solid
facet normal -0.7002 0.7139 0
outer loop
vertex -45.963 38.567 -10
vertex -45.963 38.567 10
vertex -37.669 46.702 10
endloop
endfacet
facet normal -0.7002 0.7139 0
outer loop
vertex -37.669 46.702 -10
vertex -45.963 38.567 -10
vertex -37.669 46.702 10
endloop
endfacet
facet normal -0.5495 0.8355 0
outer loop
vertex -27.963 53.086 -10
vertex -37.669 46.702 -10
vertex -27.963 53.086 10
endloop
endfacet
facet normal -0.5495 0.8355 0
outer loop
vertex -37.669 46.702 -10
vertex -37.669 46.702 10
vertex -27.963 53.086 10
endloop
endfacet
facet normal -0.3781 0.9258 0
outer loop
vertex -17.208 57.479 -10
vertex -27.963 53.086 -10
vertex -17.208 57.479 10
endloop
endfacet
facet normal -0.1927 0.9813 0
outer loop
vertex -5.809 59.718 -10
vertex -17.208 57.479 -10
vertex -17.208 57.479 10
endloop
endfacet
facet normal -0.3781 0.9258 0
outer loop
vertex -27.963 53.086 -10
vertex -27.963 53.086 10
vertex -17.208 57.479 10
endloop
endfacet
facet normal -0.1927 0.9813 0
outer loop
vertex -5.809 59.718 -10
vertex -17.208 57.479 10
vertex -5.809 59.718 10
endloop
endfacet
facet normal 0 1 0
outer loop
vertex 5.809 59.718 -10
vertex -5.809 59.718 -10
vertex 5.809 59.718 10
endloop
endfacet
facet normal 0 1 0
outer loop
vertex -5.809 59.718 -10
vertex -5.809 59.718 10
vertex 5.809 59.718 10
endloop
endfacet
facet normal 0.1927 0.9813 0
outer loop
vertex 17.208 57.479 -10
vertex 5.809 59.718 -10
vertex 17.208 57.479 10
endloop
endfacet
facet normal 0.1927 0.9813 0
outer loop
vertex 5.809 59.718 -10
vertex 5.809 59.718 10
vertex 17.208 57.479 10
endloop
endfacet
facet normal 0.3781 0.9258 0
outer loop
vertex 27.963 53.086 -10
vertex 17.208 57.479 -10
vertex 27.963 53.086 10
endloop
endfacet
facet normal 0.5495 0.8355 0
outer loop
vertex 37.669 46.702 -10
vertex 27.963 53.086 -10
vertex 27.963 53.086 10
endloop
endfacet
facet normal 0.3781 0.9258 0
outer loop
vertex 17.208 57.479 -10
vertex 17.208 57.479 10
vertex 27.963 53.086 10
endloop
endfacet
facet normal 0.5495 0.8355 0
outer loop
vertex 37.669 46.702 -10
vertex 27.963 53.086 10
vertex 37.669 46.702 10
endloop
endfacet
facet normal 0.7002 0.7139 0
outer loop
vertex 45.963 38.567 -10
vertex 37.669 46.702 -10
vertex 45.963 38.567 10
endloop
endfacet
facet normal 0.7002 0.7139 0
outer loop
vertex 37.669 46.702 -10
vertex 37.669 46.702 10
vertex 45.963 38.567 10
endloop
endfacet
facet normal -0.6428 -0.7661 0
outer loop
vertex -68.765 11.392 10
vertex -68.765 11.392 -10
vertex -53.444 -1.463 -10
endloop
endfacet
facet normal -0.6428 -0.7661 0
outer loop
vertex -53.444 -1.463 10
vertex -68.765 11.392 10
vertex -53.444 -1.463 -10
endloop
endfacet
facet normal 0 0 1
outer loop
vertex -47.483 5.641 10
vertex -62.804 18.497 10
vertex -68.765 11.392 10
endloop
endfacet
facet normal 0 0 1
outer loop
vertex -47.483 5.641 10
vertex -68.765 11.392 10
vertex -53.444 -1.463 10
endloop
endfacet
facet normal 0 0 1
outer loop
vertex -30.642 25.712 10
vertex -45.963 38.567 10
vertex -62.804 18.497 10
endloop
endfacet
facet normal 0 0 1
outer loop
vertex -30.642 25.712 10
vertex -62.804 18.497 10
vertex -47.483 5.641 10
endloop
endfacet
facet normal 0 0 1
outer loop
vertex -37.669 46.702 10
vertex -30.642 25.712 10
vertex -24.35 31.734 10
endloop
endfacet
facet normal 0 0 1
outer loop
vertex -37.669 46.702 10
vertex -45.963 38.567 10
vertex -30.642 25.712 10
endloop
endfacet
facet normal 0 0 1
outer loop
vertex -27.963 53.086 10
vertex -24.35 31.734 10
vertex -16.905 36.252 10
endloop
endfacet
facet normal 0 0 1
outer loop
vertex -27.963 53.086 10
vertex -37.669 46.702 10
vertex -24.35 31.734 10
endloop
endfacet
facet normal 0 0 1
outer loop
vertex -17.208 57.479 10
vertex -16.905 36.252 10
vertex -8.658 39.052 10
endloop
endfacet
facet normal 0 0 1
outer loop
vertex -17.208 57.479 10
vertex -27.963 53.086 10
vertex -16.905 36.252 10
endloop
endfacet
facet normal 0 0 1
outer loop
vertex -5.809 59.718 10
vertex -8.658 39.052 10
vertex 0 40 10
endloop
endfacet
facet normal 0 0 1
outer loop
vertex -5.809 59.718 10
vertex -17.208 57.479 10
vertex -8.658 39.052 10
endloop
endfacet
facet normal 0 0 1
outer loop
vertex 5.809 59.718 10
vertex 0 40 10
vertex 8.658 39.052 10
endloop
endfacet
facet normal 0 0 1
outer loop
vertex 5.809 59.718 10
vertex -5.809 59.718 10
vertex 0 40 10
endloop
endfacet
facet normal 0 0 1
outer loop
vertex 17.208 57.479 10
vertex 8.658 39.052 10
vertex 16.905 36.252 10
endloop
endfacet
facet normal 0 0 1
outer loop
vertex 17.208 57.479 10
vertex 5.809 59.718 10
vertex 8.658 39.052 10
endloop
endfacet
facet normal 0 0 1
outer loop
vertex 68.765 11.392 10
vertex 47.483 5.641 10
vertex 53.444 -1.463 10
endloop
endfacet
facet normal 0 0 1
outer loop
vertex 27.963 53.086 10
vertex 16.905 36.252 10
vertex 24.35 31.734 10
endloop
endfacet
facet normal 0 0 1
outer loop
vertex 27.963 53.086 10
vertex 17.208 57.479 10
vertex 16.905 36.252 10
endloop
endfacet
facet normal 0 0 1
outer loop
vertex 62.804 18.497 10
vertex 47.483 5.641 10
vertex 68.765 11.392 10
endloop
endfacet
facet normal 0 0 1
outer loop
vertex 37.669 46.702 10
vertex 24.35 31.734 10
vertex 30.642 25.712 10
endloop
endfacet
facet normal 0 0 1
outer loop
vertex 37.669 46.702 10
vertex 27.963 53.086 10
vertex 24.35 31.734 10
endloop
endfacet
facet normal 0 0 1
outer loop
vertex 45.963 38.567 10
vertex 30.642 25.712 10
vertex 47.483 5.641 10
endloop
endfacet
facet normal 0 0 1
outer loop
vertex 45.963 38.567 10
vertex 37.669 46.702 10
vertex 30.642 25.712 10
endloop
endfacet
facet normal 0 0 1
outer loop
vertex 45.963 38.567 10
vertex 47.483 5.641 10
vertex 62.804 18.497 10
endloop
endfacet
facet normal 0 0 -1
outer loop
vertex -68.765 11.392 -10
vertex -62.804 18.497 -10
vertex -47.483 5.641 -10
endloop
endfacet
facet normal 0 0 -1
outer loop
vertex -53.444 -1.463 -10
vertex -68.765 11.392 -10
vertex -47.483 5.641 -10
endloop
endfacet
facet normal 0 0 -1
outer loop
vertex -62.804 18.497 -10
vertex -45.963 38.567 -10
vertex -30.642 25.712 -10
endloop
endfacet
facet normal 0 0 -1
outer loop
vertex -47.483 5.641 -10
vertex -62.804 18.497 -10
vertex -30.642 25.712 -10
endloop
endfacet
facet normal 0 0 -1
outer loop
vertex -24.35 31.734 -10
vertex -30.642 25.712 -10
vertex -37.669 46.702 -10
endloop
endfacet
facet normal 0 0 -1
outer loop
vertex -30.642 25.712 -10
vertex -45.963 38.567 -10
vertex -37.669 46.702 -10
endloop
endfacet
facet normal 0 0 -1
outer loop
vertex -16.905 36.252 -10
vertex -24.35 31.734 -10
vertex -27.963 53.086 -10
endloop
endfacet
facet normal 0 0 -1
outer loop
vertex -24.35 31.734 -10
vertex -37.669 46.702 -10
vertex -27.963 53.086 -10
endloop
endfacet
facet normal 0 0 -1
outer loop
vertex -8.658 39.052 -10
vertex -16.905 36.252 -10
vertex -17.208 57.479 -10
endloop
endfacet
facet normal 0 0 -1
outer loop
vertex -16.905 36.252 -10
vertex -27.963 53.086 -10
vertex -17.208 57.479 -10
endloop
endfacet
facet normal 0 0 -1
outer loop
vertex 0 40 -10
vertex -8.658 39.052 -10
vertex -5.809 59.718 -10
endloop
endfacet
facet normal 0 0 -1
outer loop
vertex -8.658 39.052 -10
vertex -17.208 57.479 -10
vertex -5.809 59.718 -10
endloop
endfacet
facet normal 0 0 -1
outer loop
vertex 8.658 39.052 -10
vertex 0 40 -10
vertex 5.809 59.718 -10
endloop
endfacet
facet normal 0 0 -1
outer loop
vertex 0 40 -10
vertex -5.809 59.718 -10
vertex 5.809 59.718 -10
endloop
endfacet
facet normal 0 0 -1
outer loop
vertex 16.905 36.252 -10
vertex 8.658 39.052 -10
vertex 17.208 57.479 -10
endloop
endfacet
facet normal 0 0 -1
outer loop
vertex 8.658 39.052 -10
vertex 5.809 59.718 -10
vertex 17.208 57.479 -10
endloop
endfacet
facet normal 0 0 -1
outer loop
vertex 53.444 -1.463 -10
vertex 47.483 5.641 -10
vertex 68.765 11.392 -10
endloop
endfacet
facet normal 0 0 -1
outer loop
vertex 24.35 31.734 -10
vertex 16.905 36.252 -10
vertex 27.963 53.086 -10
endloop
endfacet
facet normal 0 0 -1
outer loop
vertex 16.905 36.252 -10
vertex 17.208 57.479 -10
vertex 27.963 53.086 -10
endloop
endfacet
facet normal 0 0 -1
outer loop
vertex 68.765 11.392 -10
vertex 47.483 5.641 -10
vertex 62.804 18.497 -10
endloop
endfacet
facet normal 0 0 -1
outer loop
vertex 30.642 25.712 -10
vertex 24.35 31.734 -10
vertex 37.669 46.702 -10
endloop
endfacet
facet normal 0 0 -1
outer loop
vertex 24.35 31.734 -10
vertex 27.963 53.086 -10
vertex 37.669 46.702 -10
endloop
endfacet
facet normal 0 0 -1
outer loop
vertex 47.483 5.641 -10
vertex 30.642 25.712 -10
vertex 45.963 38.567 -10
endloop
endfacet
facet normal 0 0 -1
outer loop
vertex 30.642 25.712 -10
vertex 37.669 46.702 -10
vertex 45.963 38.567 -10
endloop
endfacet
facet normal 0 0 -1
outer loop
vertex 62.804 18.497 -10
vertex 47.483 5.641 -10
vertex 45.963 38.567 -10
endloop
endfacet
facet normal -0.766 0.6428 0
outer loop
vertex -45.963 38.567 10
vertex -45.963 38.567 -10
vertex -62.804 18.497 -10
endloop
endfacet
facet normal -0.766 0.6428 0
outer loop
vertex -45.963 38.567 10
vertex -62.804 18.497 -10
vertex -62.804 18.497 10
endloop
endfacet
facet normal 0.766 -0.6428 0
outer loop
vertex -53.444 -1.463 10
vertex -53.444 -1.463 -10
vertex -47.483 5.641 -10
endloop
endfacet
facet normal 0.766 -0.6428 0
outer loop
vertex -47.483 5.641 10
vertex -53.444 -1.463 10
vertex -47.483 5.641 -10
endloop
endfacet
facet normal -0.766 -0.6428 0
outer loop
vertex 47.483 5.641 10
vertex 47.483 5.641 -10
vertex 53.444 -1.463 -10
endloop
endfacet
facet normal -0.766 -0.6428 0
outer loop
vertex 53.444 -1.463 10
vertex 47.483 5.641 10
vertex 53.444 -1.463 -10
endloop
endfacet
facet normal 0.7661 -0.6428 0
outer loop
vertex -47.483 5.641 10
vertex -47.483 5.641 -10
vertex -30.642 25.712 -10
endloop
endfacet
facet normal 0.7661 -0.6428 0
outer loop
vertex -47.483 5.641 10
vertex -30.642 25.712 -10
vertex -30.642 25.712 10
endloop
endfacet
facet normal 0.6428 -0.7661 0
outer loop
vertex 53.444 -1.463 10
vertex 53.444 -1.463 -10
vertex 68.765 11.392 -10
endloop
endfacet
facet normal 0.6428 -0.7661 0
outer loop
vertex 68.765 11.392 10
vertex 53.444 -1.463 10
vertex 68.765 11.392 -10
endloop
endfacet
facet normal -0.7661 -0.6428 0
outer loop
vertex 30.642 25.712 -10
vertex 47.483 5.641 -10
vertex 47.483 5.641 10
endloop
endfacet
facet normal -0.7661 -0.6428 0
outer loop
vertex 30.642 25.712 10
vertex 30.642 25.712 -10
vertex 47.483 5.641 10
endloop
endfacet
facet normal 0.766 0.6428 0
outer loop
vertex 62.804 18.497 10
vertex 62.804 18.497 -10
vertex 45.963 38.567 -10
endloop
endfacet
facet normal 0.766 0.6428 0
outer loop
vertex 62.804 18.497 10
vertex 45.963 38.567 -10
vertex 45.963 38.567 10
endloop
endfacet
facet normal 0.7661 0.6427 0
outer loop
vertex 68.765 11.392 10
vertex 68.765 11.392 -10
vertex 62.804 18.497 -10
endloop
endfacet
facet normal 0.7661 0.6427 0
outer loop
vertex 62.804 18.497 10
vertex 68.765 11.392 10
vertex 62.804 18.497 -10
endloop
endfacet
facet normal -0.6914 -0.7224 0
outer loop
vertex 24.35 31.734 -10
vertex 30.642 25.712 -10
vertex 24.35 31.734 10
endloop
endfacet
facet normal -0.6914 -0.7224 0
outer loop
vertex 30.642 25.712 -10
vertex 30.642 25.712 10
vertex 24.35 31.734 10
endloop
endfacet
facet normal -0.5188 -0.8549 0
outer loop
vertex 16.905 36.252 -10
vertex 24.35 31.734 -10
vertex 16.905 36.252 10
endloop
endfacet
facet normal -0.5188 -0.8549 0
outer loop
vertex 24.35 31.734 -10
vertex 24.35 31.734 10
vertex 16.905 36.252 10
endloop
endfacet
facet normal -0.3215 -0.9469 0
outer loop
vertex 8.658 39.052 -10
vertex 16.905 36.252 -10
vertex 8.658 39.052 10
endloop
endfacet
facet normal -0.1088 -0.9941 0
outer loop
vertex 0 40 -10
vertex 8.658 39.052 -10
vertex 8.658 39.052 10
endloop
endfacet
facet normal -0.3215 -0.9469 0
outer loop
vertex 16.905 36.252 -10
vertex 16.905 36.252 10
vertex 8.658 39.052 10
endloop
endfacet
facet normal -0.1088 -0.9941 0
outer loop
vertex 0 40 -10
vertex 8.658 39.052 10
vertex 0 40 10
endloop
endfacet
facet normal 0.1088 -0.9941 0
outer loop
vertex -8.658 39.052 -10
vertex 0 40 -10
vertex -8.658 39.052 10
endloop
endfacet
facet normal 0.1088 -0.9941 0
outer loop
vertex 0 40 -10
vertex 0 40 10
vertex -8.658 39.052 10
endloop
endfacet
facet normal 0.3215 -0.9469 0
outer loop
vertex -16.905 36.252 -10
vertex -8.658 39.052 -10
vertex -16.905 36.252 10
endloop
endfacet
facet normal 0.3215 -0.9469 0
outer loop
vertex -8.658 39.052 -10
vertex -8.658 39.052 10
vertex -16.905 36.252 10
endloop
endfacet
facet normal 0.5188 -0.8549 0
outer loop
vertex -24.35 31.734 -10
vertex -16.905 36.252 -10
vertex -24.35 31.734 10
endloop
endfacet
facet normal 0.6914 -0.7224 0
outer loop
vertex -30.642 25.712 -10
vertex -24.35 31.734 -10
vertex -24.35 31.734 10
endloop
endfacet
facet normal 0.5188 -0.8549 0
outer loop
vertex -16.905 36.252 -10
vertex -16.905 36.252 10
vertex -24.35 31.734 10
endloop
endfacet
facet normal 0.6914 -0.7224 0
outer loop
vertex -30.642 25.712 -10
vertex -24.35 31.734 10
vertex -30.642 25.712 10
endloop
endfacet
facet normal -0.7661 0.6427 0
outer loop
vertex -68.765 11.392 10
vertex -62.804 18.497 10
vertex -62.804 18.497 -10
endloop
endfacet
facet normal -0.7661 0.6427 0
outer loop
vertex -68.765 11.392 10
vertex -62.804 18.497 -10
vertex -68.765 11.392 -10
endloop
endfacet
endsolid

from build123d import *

# Parameters (mm, degrees)
BOSS_EXTRUDE1_DEPTH = 10
SKETCH2_W           = 20
SKETCH2_H           = 20
BOSS_EXTRUDE2_DEPTH = 26.2
BOSS_EXTRUDE3_DEPTH = 20


with BuildPart() as part:
    # Sketch1 → Boss-Extrude1 (new, symmetric)
    with BuildSketch(Plane.XY):
        with BuildLine():
            Line((45.962666587, 38.567256581), (30.641777725, 25.711504387))
            ThreePointArc((30.641777725, 25.711504387), (0, 40), (-30.641777725, 25.711504387))
            Line((-30.641777725, 25.711504387), (-45.962666587, 38.567256581))
            ThreePointArc((-45.962666587, 38.567256581), (0, 60), (45.962666587, 38.567256581))
        make_face()
    extrude(amount=BOSS_EXTRUDE1_DEPTH, both=True)

    # Sketch2 → Boss-Extrude2 (add)
    with BuildSketch(Plane(origin=(0, 0, 0), x_dir=(0, 0, 1), z_dir=(-0.6427876096865383, -0.7660444431189791, 0))):
        with Locations((0, 50)):
            Rectangle(SKETCH2_W, SKETCH2_H)
    boss_extrude2 = extrude(amount=BOSS_EXTRUDE2_DEPTH)

    # Mirror1: Boss-Extrude2 across plane
    add(boss_extrude2.mirror(Plane.ZY))

    # Sketch3 → Boss-Extrude3 (add)
    with BuildSketch(Plane(origin=(0, 0, -10), x_dir=(-1, 0, 0), z_dir=(0, 0, -1))):
        Polygon((47.482813099, 5.641139978), (62.803701961, 18.496892171), (68.765030296, 11.392457711), (53.444141434, -1.463294483), align=None)
        Polygon((-53.444141434, -1.463294483), (-68.765030296, 11.392457711), (-62.803701961, 18.496892171), (-47.482813099, 5.641139978), align=None)
    extrude(amount=-BOSS_EXTRUDE3_DEPTH)


solid = part.part
